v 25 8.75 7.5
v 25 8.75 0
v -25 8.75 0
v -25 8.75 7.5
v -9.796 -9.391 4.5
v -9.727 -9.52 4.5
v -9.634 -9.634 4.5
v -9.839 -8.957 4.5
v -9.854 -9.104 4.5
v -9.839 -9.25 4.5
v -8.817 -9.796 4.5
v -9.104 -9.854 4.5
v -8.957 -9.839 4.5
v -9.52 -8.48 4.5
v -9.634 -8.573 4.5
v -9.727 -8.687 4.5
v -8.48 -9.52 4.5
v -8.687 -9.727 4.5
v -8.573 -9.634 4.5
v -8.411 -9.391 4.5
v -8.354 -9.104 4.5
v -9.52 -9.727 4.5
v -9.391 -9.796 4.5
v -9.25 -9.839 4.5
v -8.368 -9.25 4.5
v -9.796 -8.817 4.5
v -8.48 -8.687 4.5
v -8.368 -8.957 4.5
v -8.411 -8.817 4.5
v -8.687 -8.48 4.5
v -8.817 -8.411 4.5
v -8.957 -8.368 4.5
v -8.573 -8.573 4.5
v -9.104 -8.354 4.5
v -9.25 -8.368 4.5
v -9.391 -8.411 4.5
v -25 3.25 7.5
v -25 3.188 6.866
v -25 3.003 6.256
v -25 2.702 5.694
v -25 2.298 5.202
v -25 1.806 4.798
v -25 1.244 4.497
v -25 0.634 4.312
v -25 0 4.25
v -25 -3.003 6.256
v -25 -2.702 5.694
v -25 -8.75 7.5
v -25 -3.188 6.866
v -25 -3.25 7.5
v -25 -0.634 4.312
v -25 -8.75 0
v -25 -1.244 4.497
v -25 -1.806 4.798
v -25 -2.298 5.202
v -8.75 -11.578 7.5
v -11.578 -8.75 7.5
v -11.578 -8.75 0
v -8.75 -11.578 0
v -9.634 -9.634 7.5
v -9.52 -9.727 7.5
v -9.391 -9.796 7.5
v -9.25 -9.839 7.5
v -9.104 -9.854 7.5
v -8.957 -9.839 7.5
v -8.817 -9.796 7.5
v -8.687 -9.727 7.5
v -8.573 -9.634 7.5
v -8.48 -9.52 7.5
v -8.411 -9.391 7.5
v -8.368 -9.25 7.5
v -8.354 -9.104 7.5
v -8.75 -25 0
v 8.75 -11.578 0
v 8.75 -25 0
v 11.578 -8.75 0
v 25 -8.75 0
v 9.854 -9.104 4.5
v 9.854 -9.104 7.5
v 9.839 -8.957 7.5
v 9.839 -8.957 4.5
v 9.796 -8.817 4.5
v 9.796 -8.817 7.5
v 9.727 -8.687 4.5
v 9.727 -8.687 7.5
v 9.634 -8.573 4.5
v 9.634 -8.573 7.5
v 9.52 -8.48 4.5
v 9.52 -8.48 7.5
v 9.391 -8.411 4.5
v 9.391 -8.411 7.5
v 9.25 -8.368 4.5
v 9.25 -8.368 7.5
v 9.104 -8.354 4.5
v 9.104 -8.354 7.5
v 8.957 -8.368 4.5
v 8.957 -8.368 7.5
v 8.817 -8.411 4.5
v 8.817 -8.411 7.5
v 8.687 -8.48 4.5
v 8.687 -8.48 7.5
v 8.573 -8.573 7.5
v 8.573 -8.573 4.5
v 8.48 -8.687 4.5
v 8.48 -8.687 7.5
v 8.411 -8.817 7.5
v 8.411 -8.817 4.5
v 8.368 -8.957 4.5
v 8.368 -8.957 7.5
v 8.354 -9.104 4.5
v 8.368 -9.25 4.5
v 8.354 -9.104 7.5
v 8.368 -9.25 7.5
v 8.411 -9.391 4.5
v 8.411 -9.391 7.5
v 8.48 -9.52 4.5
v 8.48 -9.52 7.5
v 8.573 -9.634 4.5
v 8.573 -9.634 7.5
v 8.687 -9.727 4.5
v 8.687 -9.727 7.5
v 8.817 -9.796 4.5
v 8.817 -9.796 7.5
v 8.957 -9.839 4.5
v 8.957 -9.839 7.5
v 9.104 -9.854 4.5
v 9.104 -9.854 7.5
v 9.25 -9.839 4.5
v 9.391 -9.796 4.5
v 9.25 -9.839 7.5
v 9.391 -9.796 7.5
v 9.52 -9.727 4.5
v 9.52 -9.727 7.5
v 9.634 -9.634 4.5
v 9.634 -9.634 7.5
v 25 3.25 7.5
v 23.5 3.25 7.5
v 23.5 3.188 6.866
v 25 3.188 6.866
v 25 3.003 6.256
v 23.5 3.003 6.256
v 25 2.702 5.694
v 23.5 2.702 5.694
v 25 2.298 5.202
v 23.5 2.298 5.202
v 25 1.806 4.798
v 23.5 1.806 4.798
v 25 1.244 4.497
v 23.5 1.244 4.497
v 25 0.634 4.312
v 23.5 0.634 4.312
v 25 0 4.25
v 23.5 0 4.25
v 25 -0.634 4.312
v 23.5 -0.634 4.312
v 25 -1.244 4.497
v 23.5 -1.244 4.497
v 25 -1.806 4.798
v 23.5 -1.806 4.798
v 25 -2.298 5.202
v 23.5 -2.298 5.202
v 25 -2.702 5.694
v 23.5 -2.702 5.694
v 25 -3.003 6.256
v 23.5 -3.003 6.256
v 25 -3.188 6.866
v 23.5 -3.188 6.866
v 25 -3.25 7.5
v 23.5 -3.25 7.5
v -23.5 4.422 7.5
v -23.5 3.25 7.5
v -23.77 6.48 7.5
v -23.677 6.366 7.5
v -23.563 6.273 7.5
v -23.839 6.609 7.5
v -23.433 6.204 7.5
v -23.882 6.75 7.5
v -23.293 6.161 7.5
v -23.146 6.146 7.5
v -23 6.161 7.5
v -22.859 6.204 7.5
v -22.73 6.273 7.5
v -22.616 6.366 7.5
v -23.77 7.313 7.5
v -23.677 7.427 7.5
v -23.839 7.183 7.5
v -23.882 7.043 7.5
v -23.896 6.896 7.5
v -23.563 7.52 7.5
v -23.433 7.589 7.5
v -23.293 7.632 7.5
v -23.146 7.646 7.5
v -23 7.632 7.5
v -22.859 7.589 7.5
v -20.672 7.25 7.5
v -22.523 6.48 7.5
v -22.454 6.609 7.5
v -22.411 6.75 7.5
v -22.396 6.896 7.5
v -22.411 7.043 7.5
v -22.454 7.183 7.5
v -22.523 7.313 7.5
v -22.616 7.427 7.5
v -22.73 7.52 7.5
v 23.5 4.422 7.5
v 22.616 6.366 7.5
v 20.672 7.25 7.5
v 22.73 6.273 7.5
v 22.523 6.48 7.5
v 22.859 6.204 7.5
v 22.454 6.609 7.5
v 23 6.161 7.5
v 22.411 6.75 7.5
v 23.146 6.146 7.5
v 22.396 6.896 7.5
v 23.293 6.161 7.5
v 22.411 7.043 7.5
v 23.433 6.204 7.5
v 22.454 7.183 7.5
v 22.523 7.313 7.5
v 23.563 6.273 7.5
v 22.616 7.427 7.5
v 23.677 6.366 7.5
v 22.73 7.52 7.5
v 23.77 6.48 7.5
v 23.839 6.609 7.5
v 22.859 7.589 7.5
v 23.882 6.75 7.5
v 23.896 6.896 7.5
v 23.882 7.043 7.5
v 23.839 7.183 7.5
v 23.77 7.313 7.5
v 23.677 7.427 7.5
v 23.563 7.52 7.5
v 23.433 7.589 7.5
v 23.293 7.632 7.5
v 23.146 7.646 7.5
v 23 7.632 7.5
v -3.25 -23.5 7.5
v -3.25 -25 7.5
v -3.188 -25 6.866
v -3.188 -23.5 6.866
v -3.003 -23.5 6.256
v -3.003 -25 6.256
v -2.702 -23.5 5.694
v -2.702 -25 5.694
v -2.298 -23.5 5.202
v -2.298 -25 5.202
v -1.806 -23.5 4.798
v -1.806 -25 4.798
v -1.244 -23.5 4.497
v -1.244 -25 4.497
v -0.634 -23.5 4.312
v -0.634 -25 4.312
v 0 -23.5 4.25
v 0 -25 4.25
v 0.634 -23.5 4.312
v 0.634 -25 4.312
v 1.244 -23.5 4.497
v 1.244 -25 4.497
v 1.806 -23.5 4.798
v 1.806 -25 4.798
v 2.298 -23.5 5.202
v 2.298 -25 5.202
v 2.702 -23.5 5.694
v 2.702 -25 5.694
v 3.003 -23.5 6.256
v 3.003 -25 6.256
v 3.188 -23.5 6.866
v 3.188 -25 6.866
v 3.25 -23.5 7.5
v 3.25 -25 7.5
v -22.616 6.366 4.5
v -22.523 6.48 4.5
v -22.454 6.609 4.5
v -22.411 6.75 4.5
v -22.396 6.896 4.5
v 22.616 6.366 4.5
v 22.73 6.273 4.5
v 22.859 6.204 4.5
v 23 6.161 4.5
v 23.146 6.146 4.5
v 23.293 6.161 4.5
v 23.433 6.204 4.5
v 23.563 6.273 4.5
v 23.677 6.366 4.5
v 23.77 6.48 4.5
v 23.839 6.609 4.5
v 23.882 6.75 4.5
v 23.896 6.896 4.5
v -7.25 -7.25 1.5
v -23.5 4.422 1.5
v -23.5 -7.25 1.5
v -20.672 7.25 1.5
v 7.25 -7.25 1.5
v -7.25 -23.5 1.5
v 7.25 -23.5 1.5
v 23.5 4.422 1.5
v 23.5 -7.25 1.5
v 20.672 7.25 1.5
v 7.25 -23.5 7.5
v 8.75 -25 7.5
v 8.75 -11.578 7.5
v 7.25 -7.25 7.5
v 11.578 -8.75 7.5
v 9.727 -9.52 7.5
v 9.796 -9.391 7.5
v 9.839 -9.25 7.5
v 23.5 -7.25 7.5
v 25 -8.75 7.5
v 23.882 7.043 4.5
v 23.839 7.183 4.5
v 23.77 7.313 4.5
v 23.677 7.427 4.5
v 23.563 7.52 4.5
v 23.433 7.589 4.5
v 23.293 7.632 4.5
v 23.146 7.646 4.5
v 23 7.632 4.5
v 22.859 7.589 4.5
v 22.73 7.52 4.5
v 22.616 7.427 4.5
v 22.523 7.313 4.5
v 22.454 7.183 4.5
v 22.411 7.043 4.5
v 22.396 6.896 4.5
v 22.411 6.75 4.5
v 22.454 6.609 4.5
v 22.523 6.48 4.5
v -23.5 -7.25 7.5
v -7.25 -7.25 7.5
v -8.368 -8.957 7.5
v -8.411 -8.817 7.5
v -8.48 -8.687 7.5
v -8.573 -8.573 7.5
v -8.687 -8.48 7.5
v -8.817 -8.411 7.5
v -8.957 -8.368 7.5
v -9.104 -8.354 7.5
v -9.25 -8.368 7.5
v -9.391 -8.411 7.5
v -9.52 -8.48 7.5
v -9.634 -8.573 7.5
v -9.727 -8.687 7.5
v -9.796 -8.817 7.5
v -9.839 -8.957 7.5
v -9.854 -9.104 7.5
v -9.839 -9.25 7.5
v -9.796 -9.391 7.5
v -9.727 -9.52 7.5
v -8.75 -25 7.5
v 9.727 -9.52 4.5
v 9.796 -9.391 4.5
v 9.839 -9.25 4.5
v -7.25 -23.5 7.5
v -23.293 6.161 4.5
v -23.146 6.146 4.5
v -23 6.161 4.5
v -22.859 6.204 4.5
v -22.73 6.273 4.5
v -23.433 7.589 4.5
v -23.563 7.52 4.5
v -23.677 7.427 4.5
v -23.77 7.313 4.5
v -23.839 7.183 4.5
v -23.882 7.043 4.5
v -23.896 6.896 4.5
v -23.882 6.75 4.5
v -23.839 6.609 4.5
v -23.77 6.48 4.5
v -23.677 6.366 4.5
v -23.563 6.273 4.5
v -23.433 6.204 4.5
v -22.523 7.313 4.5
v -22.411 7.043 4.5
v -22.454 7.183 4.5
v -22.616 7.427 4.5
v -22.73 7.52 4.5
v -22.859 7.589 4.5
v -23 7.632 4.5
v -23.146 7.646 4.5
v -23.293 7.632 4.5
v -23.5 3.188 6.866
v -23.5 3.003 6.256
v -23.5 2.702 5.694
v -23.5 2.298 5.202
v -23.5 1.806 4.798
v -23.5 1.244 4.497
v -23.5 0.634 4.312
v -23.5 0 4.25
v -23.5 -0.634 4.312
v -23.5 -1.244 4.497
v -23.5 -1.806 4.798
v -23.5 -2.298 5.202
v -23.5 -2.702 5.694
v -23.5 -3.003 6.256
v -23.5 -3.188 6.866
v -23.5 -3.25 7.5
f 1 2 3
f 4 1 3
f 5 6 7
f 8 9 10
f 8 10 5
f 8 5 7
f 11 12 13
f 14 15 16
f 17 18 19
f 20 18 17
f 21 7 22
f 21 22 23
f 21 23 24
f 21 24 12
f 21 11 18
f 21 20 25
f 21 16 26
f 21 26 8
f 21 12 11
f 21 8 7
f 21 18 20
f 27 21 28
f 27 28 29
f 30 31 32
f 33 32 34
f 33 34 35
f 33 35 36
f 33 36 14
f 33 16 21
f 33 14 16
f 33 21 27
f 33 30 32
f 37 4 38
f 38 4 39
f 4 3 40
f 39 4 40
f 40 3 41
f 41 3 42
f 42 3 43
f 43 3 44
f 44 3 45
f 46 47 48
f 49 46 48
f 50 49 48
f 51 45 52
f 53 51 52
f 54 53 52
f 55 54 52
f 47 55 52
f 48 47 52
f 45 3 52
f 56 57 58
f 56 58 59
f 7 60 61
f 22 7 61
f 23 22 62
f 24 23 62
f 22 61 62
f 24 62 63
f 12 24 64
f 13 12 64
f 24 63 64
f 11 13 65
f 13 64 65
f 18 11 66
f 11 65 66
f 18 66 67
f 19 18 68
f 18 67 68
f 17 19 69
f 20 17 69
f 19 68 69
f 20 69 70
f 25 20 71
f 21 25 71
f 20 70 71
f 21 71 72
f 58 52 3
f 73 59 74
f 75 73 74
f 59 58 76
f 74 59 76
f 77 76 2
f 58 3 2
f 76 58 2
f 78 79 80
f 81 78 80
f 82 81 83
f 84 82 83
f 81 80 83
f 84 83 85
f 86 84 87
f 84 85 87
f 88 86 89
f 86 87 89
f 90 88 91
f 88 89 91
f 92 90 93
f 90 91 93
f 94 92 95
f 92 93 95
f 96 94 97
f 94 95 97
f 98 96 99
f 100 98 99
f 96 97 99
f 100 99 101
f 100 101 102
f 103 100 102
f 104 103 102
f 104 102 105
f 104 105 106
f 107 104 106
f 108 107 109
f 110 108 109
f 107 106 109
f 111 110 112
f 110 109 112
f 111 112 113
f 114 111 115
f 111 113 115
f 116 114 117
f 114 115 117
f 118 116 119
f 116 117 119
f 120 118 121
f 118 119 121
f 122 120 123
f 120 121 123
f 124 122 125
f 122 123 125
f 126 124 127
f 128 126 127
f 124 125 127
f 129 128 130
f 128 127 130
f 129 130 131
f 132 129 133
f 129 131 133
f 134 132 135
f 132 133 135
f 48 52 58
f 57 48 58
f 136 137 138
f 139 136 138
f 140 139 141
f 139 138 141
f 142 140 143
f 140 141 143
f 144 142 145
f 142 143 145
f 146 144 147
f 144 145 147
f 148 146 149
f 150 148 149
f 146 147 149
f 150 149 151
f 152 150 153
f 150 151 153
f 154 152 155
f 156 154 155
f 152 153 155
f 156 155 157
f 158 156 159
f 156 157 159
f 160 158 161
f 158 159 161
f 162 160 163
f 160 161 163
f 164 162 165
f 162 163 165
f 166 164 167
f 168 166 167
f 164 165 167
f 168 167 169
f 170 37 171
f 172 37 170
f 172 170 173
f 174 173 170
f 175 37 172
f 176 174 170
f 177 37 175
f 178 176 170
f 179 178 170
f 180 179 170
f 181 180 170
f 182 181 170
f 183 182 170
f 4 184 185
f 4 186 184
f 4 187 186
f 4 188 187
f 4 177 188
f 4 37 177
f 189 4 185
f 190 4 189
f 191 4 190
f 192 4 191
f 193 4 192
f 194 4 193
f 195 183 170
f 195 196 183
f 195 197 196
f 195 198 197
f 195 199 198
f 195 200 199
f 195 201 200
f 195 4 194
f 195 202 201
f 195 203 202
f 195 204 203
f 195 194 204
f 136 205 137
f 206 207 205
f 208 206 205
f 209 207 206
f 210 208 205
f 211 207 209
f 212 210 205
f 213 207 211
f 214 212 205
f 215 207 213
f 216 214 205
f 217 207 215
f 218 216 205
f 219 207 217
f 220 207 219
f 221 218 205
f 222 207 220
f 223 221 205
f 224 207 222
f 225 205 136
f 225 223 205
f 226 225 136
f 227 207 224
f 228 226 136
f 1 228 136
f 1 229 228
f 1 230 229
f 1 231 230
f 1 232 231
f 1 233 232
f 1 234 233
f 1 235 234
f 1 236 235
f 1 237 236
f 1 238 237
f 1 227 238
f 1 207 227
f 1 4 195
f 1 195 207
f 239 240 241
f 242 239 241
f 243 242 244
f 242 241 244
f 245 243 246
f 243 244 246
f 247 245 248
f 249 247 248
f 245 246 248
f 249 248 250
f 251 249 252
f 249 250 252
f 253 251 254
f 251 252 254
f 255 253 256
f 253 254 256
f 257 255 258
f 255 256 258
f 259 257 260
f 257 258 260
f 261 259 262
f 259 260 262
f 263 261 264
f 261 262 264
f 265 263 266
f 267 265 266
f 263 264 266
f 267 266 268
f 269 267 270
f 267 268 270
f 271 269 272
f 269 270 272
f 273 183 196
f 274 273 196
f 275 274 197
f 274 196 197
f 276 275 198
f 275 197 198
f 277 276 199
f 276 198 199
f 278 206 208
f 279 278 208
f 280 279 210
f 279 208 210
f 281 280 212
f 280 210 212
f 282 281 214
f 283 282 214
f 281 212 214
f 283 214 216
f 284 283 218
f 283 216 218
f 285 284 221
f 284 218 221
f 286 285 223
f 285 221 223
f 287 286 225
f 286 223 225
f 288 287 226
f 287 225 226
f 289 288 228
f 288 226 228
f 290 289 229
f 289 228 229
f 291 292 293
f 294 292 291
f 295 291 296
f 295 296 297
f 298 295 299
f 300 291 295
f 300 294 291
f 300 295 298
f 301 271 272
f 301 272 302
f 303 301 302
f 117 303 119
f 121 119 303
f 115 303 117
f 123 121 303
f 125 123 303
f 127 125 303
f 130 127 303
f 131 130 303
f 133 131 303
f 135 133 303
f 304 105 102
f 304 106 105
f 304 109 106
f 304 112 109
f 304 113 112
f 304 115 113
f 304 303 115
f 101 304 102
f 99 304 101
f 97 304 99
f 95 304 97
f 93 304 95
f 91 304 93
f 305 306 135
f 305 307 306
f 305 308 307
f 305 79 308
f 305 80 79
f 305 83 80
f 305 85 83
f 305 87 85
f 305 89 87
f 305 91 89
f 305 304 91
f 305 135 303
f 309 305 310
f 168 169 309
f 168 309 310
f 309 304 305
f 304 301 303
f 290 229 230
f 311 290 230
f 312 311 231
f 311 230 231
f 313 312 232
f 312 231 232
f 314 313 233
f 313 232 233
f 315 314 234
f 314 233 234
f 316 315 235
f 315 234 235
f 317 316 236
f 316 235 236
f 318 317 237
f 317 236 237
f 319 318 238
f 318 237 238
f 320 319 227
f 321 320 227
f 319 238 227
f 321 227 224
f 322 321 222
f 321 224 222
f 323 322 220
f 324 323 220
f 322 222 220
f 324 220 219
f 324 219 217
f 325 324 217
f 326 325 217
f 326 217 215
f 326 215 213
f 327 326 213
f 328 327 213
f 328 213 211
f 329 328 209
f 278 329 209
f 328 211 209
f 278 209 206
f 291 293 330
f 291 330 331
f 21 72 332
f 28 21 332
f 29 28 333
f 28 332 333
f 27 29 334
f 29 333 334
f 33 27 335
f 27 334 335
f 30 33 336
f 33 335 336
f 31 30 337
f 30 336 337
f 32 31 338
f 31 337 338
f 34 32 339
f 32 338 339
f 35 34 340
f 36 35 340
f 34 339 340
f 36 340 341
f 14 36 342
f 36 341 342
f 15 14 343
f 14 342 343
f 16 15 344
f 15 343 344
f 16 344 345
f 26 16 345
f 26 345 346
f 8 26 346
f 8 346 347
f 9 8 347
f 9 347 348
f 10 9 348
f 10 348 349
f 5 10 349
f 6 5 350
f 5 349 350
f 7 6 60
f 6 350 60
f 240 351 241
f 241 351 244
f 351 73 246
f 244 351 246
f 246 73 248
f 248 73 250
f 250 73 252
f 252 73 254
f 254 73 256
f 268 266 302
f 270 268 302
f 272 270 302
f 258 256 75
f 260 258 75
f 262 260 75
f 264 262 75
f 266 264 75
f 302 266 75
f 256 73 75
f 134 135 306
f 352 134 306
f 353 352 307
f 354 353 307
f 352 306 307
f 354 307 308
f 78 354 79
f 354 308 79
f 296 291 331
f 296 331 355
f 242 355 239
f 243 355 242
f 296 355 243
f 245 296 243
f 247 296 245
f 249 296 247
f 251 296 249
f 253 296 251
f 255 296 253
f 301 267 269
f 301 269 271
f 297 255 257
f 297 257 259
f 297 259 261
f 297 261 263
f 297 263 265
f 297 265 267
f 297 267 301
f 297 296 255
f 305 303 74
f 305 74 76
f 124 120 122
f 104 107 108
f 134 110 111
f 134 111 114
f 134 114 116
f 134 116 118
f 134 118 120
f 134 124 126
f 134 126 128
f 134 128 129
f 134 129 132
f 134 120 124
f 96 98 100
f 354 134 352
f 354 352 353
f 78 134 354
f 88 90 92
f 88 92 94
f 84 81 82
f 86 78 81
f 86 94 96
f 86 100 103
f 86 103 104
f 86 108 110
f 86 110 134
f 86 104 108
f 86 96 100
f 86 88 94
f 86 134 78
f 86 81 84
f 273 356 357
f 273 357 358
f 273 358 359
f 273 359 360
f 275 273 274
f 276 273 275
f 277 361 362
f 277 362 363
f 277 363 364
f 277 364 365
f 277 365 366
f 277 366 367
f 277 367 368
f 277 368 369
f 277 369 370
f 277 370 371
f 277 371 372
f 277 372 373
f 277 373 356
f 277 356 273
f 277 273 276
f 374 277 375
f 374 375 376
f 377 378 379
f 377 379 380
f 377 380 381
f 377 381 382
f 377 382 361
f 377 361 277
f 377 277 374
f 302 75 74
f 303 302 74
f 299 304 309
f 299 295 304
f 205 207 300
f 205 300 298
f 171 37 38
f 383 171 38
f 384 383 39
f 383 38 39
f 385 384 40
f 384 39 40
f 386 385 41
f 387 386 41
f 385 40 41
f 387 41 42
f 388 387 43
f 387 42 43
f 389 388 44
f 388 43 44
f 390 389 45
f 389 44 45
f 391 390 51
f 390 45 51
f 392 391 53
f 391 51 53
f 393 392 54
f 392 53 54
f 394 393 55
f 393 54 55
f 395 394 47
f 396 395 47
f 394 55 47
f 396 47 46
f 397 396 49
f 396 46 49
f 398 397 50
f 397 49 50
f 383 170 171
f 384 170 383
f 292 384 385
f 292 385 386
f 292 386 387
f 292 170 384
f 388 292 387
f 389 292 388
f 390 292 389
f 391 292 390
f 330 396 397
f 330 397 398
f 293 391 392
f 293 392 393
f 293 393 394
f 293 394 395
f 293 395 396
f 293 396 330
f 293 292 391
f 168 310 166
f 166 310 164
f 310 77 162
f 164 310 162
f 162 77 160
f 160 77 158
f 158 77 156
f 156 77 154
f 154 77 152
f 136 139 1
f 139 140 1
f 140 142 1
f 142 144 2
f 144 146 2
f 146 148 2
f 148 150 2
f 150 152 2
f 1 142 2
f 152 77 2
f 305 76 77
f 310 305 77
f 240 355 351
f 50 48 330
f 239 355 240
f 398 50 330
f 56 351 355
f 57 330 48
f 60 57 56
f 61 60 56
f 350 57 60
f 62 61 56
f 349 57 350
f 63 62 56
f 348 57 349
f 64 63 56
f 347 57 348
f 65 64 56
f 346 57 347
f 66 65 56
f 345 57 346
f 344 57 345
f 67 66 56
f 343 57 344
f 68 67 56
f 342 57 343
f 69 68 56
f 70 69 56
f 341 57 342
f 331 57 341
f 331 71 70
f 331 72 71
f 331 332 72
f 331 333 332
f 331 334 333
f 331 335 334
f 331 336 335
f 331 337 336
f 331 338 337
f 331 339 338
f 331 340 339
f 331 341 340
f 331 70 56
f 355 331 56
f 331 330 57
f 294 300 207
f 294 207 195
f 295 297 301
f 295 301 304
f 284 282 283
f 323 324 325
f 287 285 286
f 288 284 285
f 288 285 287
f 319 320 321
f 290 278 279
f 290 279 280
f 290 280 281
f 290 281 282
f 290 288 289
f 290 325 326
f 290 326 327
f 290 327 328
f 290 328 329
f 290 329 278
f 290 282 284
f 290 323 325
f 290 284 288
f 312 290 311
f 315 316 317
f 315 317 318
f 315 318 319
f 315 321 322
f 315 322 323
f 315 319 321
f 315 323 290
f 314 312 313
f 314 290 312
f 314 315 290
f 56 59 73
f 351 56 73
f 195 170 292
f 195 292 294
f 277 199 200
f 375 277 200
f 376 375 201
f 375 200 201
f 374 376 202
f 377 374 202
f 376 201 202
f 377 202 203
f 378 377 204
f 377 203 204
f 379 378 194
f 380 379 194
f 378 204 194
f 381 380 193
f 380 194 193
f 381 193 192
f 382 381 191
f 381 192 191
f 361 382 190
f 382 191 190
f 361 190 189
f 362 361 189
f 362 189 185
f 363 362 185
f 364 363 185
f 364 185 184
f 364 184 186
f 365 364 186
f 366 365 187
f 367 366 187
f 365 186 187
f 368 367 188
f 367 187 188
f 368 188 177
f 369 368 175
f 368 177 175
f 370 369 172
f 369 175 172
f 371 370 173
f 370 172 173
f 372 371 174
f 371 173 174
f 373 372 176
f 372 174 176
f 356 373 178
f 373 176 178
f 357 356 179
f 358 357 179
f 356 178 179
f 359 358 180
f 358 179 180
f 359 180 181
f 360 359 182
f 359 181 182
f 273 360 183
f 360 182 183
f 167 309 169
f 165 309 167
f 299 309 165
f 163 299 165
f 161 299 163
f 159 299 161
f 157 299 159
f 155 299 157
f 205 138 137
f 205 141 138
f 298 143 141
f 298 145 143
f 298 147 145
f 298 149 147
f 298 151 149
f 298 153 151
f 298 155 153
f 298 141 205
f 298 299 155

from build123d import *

# Parameters (mm, degrees)
F1_DEPTH  = 7.5
F2_T      = -1.5
F4_DEPTH  = 7.5
F6_DEPTH  = 3
F7_R      = 3.25
F8_DEPTH  = 32.25
F9_R      = 3.25
F10_DEPTH = 50.001


with BuildPart() as f1:
    # F0 (on Top) → F1 (new body)
    with BuildSketch(Plane.XY):
        Polygon((25, -8.75), (25, 8.75), (8.75, 8.75), (-8.75, 8.75), (-25, 8.75), (-25, -8.75), (-8.75, -8.75), (-8.75, -25), (0, -25), (8.75, -25), (8.75, -8.75), align=None)
    extrude(amount=F1_DEPTH)

    # F2
    f2_openings = [f1.faces().sort_by_distance(p)[0] for p in [
        (0, -4.139151, 7.5),
    ]]
    offset(amount=F2_T, openings=f2_openings, kind=Kind.INTERSECTION)

    # F3 (on face) → F4 (join, through all)
    with BuildSketch(Plane.XY.offset(7.5)):
        Polygon((-23.5, 7.25), (-23.5, 4.4215728753), (-20.6715728753, 7.25), align=None)
        Polygon((-8.75, -8.75), (-11.5784271247, -8.75), (-8.75, -11.5784271247), align=None)
        Polygon((23.5, 7.25), (20.6715728753, 7.25), (23.5, 4.4215728753), align=None)
        Polygon((8.75, -11.5784271247), (11.5784271247, -8.75), (8.75, -8.75), align=None)
    extrude(amount=-F4_DEPTH)

    # F5 (on face) → F6 (cut)
    with BuildSketch(Plane.XY.offset(7.5)):
        with BuildLine():
            ThreePointArc((-9.6338834765, -9.6338834765), (-8.8165408163, -9.79646304), (-8.3535533906, -9.1035533906))
            ThreePointArc((-8.3535533906, -9.1035533906), (-9.3905659649, -8.4106437412), (-9.6338834765, -9.6338834765))
        make_face()
        with BuildLine():
            ThreePointArc((-22.6161165235, 6.3661165235), (-22.45353696, 6.6094340351), (-22.3964466094, 6.8964466094))
            ThreePointArc((-22.3964466094, 6.8964466094), (-23.8393562588, 7.1834591837), (-22.6161165235, 6.3661165235))
        make_face()
        with BuildLine():
            ThreePointArc((9.6338834765, -9.6338834765), (9.79646304, -9.3905659649), (9.8535533906, -9.1035533906))
            ThreePointArc((9.8535533906, -9.1035533906), (8.4106437412, -8.8165408163), (9.6338834765, -9.6338834765))
        make_face()
        with BuildLine():
            ThreePointArc((22.6161165235, 6.3661165235), (23.4334591837, 6.20353696), (23.8964466094, 6.8964466094))
            ThreePointArc((23.8964466094, 6.8964466094), (22.8594340351, 7.5893562588), (22.6161165235, 6.3661165235))
        make_face()
    extrude(amount=-F6_DEPTH, mode=Mode.SUBTRACT)

    # F7 (on face) → F8 (cut, through all)
    with BuildSketch(Plane.XZ.offset(25)):
        with Locations((0, 7.5)):
            Circle(F7_R)
    extrude(amount=-F8_DEPTH, mode=Mode.SUBTRACT)

    # F9 (on face) → F10 (cut, through all)
    with BuildSketch(Plane(origin=(-25, 0, 0), x_dir=(0, -1, 0), z_dir=(-1, 0, 0))):
        with Locations((0, 7.5)):
            Circle(F9_R)
    extrude(amount=-F10_DEPTH, mode=Mode.SUBTRACT)


solid = f1.part
